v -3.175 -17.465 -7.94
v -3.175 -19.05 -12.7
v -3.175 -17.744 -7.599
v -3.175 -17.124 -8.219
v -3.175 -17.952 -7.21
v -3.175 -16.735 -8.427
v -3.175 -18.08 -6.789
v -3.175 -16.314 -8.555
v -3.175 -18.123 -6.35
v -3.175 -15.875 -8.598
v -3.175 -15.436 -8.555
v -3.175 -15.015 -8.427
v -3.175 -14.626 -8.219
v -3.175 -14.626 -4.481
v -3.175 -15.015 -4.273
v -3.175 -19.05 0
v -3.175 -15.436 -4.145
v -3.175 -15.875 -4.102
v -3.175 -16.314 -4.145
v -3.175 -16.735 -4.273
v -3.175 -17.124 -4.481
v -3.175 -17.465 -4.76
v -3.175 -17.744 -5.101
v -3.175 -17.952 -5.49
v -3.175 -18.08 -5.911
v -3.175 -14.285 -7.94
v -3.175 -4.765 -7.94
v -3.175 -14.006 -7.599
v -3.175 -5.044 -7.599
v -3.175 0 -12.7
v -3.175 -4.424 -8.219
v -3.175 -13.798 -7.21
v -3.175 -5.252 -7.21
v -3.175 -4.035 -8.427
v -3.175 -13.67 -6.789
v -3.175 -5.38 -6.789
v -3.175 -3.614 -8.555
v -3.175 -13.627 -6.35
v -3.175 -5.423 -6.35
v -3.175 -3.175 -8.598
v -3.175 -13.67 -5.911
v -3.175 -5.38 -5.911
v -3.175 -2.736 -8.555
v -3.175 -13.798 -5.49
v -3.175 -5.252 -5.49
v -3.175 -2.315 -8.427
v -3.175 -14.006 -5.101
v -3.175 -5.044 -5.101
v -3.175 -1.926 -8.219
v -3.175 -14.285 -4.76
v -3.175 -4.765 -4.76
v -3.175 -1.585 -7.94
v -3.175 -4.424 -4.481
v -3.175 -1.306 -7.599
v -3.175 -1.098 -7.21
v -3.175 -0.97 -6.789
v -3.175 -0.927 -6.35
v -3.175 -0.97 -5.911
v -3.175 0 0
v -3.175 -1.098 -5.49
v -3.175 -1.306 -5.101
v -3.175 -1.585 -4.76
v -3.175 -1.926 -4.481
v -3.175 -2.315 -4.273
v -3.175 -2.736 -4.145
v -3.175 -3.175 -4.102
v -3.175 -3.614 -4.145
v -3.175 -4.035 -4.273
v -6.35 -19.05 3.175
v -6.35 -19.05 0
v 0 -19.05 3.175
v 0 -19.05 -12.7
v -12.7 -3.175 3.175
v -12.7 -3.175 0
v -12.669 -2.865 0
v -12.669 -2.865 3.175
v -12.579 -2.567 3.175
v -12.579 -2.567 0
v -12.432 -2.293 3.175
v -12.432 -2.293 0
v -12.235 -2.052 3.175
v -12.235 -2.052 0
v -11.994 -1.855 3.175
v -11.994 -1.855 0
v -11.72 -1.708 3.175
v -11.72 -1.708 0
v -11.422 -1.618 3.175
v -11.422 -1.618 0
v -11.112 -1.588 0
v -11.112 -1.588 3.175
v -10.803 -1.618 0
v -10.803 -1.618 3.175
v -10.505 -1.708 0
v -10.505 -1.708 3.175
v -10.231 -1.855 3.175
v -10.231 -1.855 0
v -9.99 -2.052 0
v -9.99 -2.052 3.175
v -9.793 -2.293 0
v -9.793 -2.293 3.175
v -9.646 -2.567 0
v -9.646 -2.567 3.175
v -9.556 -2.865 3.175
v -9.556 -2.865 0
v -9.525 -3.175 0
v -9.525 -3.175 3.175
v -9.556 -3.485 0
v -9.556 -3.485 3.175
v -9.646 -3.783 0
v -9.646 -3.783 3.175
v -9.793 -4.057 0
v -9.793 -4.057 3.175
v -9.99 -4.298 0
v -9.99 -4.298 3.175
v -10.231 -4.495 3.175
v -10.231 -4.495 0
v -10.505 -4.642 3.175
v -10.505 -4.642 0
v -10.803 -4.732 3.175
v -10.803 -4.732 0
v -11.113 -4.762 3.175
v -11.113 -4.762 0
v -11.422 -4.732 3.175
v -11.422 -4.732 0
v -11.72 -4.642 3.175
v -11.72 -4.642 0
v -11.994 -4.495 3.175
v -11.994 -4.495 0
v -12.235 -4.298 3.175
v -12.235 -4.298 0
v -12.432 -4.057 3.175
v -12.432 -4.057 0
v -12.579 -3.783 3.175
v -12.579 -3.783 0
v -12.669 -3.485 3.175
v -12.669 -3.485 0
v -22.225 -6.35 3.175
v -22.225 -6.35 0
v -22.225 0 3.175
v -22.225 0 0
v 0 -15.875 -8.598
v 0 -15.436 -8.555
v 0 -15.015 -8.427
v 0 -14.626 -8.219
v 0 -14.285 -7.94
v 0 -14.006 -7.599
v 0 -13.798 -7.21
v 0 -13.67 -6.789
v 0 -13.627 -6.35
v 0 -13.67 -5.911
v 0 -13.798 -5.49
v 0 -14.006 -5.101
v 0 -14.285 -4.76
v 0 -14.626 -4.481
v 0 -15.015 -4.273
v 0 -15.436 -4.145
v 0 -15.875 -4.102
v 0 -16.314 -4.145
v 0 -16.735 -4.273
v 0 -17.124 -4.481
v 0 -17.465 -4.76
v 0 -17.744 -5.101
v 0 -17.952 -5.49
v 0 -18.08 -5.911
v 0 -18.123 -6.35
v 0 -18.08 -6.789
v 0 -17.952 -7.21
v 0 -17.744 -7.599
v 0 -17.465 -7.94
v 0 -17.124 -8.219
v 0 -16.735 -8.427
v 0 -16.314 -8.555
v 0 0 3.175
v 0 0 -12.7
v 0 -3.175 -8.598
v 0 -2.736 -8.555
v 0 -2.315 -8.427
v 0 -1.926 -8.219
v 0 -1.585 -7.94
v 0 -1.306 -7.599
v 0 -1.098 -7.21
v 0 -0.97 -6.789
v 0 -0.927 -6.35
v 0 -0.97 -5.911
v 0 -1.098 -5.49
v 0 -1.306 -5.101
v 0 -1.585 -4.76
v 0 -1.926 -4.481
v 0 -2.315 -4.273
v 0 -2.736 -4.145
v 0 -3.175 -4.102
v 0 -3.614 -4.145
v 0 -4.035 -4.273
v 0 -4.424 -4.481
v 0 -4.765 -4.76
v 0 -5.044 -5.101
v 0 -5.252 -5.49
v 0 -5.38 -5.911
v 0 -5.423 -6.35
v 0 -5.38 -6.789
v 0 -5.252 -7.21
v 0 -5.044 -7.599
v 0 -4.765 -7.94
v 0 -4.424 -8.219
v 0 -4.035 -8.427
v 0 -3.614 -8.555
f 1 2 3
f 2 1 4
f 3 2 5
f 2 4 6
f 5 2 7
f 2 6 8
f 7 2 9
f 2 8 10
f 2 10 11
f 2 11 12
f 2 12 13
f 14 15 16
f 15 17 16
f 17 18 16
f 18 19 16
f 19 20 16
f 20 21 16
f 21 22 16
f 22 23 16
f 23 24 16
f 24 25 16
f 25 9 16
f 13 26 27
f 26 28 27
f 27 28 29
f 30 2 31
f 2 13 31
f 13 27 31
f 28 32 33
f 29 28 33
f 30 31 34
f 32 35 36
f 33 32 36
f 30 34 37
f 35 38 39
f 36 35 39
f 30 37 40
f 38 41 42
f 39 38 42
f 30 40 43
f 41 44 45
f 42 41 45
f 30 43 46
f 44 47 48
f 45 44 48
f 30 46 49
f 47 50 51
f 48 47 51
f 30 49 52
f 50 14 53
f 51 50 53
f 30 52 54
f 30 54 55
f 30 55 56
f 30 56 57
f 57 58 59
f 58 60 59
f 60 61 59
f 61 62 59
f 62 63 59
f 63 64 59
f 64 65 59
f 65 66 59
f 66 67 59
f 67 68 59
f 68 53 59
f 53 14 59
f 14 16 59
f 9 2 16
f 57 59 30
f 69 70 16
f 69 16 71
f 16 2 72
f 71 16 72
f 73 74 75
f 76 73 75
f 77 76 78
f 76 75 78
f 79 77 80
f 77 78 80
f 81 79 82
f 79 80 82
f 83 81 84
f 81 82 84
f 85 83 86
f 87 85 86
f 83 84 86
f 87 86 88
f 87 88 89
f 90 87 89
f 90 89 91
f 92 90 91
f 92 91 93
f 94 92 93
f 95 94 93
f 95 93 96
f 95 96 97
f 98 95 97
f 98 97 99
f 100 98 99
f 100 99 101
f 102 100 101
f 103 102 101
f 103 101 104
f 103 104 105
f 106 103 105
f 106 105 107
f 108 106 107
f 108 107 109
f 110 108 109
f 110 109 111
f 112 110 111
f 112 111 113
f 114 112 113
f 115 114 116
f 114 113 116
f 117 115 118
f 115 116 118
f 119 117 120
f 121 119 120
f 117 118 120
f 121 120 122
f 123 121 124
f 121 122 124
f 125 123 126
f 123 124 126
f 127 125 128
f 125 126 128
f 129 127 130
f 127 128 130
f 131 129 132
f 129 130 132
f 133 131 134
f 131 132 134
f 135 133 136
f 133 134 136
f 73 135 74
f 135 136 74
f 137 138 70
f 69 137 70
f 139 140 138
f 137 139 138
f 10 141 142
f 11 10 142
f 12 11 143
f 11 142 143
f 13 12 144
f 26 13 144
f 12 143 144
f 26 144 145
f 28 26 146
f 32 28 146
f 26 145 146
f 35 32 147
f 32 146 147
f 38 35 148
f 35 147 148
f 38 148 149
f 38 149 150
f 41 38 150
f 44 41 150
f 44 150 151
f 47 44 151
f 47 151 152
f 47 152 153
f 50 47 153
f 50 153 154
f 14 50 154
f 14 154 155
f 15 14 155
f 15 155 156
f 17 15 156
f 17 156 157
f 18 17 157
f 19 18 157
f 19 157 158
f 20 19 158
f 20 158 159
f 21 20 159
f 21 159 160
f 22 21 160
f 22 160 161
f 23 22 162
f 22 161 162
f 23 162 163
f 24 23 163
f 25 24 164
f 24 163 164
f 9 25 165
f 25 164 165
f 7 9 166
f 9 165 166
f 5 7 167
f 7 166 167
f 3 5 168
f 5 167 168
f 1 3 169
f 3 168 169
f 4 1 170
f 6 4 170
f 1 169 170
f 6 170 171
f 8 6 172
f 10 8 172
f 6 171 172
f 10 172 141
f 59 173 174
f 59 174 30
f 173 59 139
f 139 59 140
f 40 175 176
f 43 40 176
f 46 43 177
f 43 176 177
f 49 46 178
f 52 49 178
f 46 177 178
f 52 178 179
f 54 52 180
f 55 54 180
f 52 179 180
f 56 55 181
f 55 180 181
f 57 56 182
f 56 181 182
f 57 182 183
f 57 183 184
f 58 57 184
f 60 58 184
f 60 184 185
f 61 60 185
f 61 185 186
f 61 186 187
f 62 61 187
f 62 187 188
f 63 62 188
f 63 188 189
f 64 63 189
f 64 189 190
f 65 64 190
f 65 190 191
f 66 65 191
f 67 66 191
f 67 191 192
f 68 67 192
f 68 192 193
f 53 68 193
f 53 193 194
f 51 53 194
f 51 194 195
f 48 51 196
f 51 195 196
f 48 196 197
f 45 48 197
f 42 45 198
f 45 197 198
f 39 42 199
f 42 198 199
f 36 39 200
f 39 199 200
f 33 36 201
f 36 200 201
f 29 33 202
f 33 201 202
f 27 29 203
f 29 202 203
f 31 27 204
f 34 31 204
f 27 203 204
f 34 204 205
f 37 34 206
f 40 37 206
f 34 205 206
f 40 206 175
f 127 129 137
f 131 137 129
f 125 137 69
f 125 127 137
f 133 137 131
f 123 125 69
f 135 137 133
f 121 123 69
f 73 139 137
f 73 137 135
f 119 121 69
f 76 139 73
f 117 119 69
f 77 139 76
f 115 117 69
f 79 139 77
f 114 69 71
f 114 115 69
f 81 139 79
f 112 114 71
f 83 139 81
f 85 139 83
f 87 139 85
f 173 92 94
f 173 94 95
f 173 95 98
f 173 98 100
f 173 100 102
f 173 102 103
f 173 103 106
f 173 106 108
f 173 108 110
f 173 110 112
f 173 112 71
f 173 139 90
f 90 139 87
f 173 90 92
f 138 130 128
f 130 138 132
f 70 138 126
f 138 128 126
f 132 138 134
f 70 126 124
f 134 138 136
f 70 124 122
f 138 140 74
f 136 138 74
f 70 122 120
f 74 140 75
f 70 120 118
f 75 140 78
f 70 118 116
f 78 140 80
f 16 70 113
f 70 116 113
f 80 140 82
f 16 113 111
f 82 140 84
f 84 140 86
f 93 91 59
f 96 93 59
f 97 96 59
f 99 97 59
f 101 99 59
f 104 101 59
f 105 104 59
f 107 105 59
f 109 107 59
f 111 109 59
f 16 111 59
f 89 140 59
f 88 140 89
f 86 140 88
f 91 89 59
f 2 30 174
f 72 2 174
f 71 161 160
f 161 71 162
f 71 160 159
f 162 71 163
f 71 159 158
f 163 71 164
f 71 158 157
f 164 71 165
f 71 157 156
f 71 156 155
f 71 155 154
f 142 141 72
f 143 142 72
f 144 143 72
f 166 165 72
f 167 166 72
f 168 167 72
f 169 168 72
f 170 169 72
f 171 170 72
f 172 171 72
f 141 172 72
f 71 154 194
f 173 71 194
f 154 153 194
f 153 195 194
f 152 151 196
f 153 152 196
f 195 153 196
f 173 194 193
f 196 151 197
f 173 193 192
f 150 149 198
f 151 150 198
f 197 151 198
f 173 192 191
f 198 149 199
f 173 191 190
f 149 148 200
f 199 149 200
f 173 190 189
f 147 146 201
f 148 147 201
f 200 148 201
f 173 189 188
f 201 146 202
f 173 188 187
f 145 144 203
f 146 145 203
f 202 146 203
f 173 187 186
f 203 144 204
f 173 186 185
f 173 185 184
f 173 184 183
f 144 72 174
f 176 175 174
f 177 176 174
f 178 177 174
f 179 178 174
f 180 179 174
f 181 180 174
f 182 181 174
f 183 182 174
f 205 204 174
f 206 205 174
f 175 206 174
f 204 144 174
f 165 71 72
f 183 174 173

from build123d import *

# Parameters (mm, degrees)
BOSS_EXTRUDE1_DEPTH        = 3.175
F_1_8_0_1250_DOWEL_HOLE2_D = 3.175
SKETCH7_W                  = 3.175
SKETCH7_H                  = 19.05
BOSS_EXTRUDE2_DEPTH        = 15.875
F_8_CLEARANCE_HOLE1_D      = 4.4958


with BuildPart() as part:
    # Sketch1 → Boss-Extrude1 (new body)
    with BuildSketch(Plane.XY):
        Polygon((0, 0), (-22.225, 0), (-22.225, -6.35), (-6.35, -19.05), (0, -19.05), align=None)
    extrude(amount=BOSS_EXTRUDE1_DEPTH)

    # 1/8 (0.1250) Dowel Hole2 (through all)
    with Locations(Plane.XY.offset(3.175)):
        with Locations((-11.1125, -3.175)):
            Hole(F_1_8_0_1250_DOWEL_HOLE2_D / 2)

    # Sketch7 → Boss-Extrude2 (add)
    with BuildSketch(Plane.XY.offset(3.175)):
        with Locations((-1.5875, -9.525)):
            Rectangle(SKETCH7_W, SKETCH7_H)
    extrude(amount=-BOSS_EXTRUDE2_DEPTH)

    # #8 Clearance Hole1 (through all)
    with Locations(Plane.ZY.offset(3.175)):
        with Locations((-6.35, -15.875), (-6.35, -3.175)):
            Hole(F_8_CLEARANCE_HOLE1_D / 2)


solid = part.part
